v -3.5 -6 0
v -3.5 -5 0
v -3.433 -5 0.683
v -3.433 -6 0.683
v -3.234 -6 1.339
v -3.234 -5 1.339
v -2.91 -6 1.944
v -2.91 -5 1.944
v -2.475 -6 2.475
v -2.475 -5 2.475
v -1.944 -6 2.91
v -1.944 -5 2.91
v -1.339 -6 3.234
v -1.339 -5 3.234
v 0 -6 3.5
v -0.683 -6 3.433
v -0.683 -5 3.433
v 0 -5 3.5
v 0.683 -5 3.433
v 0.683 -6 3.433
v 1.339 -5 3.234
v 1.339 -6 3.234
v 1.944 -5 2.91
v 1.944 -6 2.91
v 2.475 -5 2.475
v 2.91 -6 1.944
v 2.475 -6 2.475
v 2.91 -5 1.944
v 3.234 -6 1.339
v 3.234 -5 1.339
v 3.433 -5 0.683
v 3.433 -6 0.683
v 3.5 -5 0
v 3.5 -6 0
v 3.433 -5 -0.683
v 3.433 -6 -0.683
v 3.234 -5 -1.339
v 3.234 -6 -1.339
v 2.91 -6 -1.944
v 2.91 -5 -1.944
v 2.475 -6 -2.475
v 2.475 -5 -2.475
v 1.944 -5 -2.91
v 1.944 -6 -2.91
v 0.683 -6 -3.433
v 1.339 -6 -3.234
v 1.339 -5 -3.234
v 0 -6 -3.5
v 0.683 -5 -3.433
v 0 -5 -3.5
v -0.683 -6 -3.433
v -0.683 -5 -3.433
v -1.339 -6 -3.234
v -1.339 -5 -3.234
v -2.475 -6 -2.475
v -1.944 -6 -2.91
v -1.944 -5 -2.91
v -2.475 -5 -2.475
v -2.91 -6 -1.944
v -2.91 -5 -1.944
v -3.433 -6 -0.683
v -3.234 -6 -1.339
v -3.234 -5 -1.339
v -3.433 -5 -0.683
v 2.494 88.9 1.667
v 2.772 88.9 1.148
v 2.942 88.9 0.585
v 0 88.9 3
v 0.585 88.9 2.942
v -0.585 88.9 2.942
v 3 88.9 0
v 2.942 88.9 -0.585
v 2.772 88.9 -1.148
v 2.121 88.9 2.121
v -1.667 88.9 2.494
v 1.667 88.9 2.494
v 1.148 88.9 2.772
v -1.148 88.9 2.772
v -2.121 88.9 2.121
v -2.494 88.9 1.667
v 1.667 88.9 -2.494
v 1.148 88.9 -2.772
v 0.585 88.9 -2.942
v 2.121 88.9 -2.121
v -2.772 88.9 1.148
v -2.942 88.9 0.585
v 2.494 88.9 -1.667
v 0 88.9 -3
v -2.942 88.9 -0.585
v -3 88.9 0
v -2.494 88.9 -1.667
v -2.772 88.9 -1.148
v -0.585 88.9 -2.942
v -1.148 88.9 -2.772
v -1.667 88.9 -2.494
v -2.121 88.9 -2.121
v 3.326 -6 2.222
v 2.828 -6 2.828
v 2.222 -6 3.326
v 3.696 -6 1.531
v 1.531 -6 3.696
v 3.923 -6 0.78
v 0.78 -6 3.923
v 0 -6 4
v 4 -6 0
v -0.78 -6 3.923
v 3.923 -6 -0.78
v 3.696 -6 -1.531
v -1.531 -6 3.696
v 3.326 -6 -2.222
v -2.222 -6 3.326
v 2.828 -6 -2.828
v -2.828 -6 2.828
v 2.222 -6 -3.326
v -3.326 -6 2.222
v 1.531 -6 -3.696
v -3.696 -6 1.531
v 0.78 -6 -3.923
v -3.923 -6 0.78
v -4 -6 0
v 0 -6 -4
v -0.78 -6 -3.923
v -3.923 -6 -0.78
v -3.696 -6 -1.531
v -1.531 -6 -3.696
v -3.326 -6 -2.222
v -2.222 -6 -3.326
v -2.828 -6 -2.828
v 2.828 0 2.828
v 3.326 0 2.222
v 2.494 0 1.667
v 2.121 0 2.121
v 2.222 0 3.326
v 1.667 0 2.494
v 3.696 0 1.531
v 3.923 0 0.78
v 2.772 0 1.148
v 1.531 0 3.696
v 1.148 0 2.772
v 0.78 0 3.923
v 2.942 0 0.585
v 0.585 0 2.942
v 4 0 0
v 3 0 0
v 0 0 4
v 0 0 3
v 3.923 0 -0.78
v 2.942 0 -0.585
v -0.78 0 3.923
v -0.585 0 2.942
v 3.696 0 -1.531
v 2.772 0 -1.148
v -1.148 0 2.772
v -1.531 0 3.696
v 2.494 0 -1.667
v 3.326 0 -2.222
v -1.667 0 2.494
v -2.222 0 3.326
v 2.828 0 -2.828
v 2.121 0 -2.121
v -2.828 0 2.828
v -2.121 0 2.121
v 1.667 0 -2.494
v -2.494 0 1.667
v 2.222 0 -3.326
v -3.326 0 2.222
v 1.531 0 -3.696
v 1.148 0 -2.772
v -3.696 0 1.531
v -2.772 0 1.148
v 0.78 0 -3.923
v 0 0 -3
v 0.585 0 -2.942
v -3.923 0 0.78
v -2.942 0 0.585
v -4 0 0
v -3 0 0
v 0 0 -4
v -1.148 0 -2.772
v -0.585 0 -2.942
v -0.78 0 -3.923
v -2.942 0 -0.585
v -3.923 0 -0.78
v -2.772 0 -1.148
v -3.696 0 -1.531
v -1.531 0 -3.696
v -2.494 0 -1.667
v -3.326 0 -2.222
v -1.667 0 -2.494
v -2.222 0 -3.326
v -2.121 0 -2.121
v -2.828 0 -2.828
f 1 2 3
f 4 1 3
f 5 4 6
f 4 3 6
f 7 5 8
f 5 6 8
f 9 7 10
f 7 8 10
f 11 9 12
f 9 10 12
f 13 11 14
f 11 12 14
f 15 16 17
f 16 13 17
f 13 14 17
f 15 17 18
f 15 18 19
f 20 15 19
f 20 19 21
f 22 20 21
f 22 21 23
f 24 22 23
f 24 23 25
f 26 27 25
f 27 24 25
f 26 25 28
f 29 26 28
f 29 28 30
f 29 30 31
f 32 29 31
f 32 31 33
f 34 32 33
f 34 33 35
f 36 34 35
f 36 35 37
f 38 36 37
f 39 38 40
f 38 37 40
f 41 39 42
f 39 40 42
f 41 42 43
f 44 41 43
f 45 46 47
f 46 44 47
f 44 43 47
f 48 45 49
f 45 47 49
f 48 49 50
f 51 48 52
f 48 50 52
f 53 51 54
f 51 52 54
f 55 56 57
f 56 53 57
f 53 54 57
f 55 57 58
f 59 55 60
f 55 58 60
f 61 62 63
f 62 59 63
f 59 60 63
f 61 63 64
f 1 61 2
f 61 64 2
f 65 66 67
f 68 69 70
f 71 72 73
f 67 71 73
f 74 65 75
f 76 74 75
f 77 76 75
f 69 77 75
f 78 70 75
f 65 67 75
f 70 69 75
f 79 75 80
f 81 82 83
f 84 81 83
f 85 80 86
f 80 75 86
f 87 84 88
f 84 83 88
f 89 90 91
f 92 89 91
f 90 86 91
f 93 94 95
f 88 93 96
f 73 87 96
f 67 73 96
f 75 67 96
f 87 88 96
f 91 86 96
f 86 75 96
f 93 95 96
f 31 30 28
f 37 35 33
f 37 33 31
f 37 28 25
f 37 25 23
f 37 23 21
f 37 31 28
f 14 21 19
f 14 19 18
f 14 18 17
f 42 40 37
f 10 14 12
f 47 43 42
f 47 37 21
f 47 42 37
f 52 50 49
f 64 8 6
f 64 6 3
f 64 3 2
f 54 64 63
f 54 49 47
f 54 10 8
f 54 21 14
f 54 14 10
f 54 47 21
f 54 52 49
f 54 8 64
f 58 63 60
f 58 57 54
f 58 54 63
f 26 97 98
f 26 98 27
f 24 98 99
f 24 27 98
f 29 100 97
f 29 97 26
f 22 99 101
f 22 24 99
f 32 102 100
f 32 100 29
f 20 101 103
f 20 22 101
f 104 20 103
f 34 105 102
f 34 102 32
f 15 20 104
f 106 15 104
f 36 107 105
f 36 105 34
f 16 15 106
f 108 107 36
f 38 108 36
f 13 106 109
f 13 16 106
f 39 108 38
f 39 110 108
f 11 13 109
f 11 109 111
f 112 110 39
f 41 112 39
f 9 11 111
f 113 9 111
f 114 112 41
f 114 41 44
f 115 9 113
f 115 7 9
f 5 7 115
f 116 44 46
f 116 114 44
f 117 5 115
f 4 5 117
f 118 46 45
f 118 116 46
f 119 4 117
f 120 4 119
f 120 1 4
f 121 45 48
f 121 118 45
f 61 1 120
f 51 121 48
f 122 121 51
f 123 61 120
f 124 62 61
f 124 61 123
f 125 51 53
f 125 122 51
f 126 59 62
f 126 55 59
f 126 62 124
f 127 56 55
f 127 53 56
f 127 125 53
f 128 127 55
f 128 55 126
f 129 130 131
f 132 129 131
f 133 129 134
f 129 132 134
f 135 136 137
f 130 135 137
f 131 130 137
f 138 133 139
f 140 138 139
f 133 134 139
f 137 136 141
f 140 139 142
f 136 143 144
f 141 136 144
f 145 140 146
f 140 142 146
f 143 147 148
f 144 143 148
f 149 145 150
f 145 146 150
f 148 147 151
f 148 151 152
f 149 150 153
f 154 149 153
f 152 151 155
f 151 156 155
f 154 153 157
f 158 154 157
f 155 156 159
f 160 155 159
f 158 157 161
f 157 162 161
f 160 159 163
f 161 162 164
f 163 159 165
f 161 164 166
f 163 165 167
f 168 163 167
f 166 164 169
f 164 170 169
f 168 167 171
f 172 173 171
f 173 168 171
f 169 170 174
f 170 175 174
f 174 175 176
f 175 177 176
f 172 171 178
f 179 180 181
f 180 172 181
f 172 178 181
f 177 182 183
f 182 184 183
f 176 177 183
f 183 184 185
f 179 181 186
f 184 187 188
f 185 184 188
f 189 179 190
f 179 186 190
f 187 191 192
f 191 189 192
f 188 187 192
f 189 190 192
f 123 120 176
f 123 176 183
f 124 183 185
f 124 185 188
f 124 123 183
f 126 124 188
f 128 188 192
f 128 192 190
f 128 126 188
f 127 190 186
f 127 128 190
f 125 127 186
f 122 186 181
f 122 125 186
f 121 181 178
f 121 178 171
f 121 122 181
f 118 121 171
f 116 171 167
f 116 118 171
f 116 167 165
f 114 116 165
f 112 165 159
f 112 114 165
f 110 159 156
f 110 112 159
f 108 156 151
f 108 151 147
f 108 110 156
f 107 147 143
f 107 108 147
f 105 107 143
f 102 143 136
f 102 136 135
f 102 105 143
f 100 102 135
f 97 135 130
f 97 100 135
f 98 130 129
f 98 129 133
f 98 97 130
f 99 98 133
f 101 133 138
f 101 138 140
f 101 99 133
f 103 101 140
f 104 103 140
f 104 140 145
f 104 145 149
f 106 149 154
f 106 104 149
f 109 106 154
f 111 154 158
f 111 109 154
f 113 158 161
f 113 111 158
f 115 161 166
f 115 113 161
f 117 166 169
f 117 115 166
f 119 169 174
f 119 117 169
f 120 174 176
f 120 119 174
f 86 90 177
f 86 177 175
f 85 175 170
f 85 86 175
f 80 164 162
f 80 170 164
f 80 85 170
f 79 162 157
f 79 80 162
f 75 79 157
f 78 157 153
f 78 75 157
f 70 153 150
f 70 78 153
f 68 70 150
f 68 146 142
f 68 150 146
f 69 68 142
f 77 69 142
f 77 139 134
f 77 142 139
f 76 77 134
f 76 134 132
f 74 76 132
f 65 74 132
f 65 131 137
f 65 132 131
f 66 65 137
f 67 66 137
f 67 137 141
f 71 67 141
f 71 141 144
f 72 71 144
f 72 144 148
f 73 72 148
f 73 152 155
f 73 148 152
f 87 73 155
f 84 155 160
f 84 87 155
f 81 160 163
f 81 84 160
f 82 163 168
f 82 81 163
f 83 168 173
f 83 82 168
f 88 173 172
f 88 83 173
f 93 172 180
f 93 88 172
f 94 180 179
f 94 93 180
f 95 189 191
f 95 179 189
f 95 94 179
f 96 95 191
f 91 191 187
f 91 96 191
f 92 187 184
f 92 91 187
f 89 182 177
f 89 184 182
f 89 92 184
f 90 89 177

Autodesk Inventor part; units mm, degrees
ref_plane "YZ Plane" through (0, 0, 0) normal (1, 0, 0) x (0, 1, 0)
ref_plane "XZ Plane" through (0, 0, 0) normal (0, 1, 0) x (-1, 0, 0)
ref_plane "XY Plane" through (0, 0, 0) normal (0, 0, 1) x (1, 0, 0)
sketch "Sketch1" plane through (0, 0, 0) normal (0, 0, 1) x (1, 0, 0)
  line L0 (-3, 0) -> (-3, 88.9)
  line L1 (-3, 88.9) -> (0, 88.9)
  line L2 (0, 88.9) -> (0, 0)
  line L3 (-3, 0) -> (-4, 0)
  line L4 (-4, 0) -> (-4, -6)
  line L5 (-4, -6) -> (-3.5, -6)
  line L6 (-3.5, -6) -> (-3.5, -5)
  line L7 (-3.5, -5) -> (0, -5)
  line L8 (0, -5) -> (0, 0)
  dimension "d0" = 3
  dimension "d1" = 88.9
  dimension "d7" = 6
  dimension "d9" = 4
  dimension "d10" = 1
  dimension "d11" = 0.5
revolve "Revolution1" add sketch "Sketch1" angle 360 about axis through (0, 88.9, 0) along (0, -1, 0)
equation "\"BendRadius\" = Thickness"
equation "\"BendReliefWidth\" = Thickness"
equation "\"BendReliefDepth\" = 0.5 * Thickness"
equation "\"CornerReliefSize\" = 4 * Thickness"
equation "\"MinimumRemnant\" = 2 * Thickness"
equation "\"TransitionRadius\" = BendRadius"
equation "\"JacobiRadiusSize\" = BendRadius"
equation "\"GapSize\" = Thickness"
equation "\"Thickness\" = 0.5"
properties part number "Pusher.Pushrod" material "Stainless Steel"
